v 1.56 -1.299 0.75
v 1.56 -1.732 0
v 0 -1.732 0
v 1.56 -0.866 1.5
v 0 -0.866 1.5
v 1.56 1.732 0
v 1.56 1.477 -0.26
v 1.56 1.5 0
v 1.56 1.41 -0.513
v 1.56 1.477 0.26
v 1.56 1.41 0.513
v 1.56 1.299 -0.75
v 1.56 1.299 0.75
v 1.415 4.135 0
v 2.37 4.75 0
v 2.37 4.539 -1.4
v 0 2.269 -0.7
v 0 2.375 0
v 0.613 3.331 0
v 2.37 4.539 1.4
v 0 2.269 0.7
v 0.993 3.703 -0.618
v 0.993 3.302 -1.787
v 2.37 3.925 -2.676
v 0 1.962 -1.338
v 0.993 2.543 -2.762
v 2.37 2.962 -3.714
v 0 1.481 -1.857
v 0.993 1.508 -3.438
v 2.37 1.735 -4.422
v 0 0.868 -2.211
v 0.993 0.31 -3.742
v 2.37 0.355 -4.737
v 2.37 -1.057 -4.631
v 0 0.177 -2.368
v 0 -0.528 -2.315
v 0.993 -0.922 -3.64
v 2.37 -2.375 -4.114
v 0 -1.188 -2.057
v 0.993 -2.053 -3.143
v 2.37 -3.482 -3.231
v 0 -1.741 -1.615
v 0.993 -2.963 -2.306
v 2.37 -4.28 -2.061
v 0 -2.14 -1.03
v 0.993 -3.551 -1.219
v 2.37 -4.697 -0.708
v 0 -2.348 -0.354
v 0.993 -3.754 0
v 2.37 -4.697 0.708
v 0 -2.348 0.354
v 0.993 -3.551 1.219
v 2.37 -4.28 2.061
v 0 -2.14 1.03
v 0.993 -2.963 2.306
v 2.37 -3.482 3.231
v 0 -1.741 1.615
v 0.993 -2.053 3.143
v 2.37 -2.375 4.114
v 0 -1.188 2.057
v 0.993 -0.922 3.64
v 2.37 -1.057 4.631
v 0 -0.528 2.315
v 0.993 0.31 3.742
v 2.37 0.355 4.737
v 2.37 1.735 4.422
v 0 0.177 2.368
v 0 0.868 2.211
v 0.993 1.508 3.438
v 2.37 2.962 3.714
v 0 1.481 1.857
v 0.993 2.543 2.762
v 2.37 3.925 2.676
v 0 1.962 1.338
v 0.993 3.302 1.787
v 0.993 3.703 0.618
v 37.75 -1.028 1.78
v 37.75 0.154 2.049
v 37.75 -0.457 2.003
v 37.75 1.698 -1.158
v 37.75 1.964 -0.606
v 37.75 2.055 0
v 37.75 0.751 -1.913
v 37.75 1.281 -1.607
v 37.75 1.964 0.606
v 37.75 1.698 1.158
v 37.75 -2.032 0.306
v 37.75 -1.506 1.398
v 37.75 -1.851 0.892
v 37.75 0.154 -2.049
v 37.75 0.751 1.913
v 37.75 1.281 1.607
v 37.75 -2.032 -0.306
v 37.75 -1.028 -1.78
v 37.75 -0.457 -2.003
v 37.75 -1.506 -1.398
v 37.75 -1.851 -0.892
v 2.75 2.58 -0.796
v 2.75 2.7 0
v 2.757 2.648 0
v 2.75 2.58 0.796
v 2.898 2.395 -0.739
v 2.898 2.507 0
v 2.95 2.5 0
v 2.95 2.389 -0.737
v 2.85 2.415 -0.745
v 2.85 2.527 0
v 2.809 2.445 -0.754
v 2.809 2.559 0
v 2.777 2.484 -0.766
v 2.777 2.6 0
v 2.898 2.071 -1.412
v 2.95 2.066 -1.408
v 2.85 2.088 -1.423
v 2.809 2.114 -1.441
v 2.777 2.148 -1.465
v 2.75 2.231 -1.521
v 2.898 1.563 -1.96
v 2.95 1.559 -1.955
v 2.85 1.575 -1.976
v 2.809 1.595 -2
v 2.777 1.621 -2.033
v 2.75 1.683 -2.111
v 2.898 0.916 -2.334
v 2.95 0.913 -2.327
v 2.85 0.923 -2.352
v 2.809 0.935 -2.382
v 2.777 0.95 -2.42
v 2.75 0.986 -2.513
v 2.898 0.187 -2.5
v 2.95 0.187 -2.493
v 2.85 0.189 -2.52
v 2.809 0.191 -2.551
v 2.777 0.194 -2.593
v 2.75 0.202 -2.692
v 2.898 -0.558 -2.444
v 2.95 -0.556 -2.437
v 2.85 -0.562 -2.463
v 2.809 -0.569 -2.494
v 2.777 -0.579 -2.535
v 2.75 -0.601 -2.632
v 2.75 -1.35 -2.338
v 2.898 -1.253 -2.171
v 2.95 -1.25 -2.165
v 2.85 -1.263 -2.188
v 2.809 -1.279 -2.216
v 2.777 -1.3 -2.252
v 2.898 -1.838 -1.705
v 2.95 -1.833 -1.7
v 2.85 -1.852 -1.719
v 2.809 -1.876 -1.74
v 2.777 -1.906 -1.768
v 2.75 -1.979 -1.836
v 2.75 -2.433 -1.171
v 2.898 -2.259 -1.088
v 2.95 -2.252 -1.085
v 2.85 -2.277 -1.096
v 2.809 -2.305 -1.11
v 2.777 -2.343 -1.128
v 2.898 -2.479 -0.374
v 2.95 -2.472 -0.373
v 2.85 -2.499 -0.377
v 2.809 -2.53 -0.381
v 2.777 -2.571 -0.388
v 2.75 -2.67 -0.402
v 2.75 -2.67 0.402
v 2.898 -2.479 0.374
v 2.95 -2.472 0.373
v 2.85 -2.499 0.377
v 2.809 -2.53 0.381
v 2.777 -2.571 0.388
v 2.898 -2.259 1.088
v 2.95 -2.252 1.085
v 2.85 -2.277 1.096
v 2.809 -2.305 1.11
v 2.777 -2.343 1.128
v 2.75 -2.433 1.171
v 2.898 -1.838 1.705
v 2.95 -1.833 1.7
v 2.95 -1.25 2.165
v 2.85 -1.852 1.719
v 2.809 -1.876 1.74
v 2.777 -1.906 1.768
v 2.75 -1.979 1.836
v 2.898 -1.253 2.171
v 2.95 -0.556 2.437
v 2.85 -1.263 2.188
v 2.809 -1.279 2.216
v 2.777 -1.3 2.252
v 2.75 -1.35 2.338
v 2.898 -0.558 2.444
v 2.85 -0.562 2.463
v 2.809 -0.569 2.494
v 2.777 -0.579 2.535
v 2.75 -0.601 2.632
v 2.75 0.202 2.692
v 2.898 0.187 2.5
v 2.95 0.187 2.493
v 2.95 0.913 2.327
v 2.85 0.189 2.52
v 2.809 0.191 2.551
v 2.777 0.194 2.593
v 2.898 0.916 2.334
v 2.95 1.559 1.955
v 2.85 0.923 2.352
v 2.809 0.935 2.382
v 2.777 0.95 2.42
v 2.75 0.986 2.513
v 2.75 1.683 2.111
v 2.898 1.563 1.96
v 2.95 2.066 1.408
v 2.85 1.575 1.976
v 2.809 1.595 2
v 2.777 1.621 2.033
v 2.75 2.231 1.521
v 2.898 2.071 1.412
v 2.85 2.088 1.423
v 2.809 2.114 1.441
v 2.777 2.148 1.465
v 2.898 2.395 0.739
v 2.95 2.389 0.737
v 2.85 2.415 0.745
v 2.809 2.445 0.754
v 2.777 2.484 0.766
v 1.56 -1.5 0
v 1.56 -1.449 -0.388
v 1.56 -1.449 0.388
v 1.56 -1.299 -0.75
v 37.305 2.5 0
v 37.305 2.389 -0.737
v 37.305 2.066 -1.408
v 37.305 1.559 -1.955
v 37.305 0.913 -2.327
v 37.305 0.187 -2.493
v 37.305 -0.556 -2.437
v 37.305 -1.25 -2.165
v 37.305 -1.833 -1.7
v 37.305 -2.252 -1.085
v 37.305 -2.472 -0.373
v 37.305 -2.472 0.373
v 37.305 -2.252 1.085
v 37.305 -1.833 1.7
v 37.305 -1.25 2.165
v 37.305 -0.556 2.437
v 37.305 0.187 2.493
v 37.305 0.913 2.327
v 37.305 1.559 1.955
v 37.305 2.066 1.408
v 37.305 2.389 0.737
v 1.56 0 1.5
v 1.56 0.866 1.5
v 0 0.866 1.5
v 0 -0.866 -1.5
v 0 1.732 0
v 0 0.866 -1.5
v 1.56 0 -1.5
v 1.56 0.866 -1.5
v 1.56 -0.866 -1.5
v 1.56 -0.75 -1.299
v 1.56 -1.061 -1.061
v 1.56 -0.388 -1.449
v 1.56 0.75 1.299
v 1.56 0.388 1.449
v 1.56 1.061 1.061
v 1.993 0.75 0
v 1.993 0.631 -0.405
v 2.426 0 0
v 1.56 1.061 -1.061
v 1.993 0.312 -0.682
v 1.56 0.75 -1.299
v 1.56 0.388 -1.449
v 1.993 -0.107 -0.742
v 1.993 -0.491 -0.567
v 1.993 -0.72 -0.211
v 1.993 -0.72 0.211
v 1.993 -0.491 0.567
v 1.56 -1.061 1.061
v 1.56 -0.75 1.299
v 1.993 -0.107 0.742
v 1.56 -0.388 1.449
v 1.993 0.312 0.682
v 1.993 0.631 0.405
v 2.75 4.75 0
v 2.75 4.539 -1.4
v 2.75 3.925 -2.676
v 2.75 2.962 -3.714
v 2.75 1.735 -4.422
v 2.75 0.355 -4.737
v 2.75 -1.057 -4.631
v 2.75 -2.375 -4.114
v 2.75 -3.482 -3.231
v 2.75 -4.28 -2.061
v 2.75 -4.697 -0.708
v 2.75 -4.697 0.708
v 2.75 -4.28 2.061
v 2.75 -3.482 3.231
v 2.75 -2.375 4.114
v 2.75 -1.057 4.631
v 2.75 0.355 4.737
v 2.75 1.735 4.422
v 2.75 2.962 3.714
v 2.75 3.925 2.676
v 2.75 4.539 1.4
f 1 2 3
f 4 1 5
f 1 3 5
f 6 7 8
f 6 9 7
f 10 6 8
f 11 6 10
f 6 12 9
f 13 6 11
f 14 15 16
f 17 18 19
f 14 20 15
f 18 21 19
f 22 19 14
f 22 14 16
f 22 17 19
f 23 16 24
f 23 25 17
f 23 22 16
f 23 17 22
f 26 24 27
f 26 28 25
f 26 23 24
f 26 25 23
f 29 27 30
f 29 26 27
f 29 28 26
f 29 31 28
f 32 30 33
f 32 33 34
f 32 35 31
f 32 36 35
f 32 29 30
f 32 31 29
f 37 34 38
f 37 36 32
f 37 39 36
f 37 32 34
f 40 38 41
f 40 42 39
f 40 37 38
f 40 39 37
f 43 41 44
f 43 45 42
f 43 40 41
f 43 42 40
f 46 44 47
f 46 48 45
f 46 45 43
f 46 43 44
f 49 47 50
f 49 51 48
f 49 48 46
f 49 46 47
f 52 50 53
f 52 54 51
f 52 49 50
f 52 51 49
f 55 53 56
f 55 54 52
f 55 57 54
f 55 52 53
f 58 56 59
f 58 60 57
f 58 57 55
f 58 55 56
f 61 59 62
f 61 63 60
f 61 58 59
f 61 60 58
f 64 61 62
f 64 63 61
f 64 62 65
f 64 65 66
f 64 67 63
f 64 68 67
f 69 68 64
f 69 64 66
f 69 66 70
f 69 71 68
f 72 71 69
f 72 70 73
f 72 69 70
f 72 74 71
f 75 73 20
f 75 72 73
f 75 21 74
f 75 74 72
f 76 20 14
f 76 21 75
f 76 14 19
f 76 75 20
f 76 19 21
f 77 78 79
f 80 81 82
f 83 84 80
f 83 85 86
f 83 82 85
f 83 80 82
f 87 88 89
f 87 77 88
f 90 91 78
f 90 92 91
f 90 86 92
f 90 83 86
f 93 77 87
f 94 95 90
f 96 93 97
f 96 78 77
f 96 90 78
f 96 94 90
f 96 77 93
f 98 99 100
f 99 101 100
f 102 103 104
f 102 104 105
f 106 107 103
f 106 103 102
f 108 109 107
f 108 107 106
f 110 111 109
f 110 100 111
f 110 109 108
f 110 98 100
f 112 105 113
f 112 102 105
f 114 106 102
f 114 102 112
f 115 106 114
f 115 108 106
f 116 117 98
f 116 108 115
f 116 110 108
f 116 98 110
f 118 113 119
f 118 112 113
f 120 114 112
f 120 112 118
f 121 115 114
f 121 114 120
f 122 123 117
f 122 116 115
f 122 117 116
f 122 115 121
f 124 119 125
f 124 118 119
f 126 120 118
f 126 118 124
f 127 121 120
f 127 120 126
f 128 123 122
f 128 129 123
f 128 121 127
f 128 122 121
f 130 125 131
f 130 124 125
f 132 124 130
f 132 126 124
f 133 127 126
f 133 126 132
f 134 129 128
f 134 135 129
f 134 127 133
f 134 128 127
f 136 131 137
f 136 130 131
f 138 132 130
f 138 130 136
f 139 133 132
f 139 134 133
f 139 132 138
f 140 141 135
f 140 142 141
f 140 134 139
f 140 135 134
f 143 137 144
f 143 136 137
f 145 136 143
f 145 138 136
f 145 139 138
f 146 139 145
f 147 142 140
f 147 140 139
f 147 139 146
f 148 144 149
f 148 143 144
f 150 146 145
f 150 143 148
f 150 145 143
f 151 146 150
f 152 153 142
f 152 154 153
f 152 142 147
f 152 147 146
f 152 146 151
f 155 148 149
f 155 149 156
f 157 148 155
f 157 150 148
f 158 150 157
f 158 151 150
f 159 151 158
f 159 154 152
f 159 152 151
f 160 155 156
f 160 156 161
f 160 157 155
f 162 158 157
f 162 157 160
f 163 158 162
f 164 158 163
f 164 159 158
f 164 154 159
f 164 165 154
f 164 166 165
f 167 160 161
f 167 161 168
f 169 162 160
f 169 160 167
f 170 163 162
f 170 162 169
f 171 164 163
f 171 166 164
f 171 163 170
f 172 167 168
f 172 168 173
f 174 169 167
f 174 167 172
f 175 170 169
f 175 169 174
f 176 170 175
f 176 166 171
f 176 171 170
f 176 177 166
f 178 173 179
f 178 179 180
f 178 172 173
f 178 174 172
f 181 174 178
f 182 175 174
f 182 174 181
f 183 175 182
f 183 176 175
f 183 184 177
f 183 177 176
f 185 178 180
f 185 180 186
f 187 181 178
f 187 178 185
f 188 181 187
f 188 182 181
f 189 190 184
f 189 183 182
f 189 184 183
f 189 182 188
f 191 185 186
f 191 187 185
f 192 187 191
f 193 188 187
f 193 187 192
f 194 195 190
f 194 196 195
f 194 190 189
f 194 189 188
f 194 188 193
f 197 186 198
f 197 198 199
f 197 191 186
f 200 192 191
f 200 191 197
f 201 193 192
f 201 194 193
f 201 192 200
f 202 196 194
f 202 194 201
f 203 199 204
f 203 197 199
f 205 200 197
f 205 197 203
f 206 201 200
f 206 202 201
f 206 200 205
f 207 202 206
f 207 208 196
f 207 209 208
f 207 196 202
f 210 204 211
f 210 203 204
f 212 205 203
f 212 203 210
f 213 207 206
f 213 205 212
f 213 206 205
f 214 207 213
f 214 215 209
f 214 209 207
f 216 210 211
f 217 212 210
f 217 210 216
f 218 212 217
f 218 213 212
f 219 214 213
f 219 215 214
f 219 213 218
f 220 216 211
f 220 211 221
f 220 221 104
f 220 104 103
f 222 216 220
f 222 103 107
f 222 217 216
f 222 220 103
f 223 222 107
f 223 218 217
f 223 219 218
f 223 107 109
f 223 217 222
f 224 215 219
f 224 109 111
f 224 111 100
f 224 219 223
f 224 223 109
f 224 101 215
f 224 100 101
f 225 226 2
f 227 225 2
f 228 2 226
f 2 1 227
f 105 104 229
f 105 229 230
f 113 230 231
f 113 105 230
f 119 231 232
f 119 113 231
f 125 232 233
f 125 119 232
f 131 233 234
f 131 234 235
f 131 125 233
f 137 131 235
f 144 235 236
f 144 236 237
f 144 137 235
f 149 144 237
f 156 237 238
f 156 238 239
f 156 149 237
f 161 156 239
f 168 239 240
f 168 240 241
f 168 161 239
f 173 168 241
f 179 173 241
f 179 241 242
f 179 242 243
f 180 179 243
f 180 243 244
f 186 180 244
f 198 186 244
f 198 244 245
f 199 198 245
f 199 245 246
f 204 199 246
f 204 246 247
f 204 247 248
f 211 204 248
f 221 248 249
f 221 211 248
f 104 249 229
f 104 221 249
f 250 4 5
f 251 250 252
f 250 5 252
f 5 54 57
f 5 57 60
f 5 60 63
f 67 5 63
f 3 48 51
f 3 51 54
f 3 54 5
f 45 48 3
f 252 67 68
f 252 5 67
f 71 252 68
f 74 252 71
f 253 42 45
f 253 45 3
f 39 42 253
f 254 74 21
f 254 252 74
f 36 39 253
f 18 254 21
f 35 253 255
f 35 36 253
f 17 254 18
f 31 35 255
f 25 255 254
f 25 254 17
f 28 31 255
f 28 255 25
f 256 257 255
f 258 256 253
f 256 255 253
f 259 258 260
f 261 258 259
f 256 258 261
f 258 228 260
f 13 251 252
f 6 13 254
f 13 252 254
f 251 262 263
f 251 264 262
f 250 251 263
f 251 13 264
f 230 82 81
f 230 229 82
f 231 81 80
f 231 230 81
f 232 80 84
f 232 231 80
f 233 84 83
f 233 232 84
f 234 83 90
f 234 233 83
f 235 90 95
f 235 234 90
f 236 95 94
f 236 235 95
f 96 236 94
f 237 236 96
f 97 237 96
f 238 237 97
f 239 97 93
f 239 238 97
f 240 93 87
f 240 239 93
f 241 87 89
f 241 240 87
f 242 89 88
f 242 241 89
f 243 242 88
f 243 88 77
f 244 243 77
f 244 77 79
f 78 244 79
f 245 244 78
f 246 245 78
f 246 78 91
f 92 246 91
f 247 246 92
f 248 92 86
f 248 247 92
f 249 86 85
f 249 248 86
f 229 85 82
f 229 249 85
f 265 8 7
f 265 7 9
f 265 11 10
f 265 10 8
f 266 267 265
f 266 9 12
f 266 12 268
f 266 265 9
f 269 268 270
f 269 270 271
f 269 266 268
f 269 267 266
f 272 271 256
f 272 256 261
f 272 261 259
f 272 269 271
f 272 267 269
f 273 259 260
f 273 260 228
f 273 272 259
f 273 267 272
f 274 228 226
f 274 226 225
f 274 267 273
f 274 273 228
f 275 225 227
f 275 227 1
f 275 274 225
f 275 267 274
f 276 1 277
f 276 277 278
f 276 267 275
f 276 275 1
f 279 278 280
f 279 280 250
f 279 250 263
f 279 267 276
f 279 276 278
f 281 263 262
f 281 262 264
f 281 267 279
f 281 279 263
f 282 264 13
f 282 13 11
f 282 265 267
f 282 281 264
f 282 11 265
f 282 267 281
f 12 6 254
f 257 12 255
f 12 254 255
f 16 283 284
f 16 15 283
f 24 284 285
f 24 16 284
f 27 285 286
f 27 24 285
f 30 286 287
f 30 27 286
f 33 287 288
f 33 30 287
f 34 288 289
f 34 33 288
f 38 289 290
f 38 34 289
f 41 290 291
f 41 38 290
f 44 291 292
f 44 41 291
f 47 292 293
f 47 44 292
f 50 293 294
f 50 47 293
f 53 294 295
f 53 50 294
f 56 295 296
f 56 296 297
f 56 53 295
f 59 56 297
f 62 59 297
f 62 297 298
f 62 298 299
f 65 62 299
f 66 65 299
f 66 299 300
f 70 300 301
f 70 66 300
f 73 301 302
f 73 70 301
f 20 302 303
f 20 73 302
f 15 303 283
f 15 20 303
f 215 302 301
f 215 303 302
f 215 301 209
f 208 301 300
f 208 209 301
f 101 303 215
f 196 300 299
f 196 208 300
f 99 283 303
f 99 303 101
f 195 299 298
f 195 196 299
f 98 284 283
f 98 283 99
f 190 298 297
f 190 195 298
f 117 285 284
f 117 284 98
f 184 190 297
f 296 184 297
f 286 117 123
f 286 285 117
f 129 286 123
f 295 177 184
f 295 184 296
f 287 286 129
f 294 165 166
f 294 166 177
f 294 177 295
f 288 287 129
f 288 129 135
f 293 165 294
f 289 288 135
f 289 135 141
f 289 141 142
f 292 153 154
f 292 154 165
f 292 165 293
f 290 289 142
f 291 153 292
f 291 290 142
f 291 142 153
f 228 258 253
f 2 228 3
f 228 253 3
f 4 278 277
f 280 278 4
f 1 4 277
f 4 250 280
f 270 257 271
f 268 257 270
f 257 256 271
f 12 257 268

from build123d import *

# Parameters (mm, degrees)
FILLET_1_R  = 0.2
HEX_2_DEPTH = 1.56


with BuildPart() as part:
    # Эскиз1 → Body (revolve)
    with BuildSketch(Plane.XY):
        with BuildLine():
            Line((0, 2.375), (0, 0))
            Line((0, 0), (37.75, 0))
            Line((37.75, 0), (37.75, 2.055))
            Line((37.75, 2.055), (37.305, 2.5))
            Line((37.305, 2.5), (2.75, 2.5))
            Line((2.75, 2.5), (2.75, 4.75))
            Line((2.75, 4.75), (2.370164642, 4.75))
            ThreePointArc((2.370164642, 4.75), (0.992749859, 3.754440885), (0, 2.375))
        make_face()
    revolve(axis=Axis((-3.643489966, 0, 0), (-1, 0, 0)))

    # Скругление1
    fillet_1_edges = [part.edges().sort_by_distance(p)[0] for p in [
        (2.75, -2.5, 0),
    ]]
    fillet(fillet_1_edges, radius=FILLET_1_R)

    # Эскиз2 → Вырез-Повернуть1 (revolve, cut)
    with BuildSketch(Plane.XY):
        Polygon((0, 0), (0, 1.5), (1.56, 1.5), (2.426025404, 0), align=None)
    revolve(axis=Axis((2.426025404, 0, 0), (-1, 0, 0)), mode=Mode.SUBTRACT)

    # Эскиз3 → Hex 2 (cut)
    with BuildSketch(Plane.ZY):
        Polygon((-1.5, -0.866025404), (0, -1.732050808), (1.5, -0.866025404), (1.5, 0.866025404), (0, 1.732050808), (-1.5, 0.866025404), align=None)
    extrude(amount=-HEX_2_DEPTH, mode=Mode.SUBTRACT)


solid = part.part
